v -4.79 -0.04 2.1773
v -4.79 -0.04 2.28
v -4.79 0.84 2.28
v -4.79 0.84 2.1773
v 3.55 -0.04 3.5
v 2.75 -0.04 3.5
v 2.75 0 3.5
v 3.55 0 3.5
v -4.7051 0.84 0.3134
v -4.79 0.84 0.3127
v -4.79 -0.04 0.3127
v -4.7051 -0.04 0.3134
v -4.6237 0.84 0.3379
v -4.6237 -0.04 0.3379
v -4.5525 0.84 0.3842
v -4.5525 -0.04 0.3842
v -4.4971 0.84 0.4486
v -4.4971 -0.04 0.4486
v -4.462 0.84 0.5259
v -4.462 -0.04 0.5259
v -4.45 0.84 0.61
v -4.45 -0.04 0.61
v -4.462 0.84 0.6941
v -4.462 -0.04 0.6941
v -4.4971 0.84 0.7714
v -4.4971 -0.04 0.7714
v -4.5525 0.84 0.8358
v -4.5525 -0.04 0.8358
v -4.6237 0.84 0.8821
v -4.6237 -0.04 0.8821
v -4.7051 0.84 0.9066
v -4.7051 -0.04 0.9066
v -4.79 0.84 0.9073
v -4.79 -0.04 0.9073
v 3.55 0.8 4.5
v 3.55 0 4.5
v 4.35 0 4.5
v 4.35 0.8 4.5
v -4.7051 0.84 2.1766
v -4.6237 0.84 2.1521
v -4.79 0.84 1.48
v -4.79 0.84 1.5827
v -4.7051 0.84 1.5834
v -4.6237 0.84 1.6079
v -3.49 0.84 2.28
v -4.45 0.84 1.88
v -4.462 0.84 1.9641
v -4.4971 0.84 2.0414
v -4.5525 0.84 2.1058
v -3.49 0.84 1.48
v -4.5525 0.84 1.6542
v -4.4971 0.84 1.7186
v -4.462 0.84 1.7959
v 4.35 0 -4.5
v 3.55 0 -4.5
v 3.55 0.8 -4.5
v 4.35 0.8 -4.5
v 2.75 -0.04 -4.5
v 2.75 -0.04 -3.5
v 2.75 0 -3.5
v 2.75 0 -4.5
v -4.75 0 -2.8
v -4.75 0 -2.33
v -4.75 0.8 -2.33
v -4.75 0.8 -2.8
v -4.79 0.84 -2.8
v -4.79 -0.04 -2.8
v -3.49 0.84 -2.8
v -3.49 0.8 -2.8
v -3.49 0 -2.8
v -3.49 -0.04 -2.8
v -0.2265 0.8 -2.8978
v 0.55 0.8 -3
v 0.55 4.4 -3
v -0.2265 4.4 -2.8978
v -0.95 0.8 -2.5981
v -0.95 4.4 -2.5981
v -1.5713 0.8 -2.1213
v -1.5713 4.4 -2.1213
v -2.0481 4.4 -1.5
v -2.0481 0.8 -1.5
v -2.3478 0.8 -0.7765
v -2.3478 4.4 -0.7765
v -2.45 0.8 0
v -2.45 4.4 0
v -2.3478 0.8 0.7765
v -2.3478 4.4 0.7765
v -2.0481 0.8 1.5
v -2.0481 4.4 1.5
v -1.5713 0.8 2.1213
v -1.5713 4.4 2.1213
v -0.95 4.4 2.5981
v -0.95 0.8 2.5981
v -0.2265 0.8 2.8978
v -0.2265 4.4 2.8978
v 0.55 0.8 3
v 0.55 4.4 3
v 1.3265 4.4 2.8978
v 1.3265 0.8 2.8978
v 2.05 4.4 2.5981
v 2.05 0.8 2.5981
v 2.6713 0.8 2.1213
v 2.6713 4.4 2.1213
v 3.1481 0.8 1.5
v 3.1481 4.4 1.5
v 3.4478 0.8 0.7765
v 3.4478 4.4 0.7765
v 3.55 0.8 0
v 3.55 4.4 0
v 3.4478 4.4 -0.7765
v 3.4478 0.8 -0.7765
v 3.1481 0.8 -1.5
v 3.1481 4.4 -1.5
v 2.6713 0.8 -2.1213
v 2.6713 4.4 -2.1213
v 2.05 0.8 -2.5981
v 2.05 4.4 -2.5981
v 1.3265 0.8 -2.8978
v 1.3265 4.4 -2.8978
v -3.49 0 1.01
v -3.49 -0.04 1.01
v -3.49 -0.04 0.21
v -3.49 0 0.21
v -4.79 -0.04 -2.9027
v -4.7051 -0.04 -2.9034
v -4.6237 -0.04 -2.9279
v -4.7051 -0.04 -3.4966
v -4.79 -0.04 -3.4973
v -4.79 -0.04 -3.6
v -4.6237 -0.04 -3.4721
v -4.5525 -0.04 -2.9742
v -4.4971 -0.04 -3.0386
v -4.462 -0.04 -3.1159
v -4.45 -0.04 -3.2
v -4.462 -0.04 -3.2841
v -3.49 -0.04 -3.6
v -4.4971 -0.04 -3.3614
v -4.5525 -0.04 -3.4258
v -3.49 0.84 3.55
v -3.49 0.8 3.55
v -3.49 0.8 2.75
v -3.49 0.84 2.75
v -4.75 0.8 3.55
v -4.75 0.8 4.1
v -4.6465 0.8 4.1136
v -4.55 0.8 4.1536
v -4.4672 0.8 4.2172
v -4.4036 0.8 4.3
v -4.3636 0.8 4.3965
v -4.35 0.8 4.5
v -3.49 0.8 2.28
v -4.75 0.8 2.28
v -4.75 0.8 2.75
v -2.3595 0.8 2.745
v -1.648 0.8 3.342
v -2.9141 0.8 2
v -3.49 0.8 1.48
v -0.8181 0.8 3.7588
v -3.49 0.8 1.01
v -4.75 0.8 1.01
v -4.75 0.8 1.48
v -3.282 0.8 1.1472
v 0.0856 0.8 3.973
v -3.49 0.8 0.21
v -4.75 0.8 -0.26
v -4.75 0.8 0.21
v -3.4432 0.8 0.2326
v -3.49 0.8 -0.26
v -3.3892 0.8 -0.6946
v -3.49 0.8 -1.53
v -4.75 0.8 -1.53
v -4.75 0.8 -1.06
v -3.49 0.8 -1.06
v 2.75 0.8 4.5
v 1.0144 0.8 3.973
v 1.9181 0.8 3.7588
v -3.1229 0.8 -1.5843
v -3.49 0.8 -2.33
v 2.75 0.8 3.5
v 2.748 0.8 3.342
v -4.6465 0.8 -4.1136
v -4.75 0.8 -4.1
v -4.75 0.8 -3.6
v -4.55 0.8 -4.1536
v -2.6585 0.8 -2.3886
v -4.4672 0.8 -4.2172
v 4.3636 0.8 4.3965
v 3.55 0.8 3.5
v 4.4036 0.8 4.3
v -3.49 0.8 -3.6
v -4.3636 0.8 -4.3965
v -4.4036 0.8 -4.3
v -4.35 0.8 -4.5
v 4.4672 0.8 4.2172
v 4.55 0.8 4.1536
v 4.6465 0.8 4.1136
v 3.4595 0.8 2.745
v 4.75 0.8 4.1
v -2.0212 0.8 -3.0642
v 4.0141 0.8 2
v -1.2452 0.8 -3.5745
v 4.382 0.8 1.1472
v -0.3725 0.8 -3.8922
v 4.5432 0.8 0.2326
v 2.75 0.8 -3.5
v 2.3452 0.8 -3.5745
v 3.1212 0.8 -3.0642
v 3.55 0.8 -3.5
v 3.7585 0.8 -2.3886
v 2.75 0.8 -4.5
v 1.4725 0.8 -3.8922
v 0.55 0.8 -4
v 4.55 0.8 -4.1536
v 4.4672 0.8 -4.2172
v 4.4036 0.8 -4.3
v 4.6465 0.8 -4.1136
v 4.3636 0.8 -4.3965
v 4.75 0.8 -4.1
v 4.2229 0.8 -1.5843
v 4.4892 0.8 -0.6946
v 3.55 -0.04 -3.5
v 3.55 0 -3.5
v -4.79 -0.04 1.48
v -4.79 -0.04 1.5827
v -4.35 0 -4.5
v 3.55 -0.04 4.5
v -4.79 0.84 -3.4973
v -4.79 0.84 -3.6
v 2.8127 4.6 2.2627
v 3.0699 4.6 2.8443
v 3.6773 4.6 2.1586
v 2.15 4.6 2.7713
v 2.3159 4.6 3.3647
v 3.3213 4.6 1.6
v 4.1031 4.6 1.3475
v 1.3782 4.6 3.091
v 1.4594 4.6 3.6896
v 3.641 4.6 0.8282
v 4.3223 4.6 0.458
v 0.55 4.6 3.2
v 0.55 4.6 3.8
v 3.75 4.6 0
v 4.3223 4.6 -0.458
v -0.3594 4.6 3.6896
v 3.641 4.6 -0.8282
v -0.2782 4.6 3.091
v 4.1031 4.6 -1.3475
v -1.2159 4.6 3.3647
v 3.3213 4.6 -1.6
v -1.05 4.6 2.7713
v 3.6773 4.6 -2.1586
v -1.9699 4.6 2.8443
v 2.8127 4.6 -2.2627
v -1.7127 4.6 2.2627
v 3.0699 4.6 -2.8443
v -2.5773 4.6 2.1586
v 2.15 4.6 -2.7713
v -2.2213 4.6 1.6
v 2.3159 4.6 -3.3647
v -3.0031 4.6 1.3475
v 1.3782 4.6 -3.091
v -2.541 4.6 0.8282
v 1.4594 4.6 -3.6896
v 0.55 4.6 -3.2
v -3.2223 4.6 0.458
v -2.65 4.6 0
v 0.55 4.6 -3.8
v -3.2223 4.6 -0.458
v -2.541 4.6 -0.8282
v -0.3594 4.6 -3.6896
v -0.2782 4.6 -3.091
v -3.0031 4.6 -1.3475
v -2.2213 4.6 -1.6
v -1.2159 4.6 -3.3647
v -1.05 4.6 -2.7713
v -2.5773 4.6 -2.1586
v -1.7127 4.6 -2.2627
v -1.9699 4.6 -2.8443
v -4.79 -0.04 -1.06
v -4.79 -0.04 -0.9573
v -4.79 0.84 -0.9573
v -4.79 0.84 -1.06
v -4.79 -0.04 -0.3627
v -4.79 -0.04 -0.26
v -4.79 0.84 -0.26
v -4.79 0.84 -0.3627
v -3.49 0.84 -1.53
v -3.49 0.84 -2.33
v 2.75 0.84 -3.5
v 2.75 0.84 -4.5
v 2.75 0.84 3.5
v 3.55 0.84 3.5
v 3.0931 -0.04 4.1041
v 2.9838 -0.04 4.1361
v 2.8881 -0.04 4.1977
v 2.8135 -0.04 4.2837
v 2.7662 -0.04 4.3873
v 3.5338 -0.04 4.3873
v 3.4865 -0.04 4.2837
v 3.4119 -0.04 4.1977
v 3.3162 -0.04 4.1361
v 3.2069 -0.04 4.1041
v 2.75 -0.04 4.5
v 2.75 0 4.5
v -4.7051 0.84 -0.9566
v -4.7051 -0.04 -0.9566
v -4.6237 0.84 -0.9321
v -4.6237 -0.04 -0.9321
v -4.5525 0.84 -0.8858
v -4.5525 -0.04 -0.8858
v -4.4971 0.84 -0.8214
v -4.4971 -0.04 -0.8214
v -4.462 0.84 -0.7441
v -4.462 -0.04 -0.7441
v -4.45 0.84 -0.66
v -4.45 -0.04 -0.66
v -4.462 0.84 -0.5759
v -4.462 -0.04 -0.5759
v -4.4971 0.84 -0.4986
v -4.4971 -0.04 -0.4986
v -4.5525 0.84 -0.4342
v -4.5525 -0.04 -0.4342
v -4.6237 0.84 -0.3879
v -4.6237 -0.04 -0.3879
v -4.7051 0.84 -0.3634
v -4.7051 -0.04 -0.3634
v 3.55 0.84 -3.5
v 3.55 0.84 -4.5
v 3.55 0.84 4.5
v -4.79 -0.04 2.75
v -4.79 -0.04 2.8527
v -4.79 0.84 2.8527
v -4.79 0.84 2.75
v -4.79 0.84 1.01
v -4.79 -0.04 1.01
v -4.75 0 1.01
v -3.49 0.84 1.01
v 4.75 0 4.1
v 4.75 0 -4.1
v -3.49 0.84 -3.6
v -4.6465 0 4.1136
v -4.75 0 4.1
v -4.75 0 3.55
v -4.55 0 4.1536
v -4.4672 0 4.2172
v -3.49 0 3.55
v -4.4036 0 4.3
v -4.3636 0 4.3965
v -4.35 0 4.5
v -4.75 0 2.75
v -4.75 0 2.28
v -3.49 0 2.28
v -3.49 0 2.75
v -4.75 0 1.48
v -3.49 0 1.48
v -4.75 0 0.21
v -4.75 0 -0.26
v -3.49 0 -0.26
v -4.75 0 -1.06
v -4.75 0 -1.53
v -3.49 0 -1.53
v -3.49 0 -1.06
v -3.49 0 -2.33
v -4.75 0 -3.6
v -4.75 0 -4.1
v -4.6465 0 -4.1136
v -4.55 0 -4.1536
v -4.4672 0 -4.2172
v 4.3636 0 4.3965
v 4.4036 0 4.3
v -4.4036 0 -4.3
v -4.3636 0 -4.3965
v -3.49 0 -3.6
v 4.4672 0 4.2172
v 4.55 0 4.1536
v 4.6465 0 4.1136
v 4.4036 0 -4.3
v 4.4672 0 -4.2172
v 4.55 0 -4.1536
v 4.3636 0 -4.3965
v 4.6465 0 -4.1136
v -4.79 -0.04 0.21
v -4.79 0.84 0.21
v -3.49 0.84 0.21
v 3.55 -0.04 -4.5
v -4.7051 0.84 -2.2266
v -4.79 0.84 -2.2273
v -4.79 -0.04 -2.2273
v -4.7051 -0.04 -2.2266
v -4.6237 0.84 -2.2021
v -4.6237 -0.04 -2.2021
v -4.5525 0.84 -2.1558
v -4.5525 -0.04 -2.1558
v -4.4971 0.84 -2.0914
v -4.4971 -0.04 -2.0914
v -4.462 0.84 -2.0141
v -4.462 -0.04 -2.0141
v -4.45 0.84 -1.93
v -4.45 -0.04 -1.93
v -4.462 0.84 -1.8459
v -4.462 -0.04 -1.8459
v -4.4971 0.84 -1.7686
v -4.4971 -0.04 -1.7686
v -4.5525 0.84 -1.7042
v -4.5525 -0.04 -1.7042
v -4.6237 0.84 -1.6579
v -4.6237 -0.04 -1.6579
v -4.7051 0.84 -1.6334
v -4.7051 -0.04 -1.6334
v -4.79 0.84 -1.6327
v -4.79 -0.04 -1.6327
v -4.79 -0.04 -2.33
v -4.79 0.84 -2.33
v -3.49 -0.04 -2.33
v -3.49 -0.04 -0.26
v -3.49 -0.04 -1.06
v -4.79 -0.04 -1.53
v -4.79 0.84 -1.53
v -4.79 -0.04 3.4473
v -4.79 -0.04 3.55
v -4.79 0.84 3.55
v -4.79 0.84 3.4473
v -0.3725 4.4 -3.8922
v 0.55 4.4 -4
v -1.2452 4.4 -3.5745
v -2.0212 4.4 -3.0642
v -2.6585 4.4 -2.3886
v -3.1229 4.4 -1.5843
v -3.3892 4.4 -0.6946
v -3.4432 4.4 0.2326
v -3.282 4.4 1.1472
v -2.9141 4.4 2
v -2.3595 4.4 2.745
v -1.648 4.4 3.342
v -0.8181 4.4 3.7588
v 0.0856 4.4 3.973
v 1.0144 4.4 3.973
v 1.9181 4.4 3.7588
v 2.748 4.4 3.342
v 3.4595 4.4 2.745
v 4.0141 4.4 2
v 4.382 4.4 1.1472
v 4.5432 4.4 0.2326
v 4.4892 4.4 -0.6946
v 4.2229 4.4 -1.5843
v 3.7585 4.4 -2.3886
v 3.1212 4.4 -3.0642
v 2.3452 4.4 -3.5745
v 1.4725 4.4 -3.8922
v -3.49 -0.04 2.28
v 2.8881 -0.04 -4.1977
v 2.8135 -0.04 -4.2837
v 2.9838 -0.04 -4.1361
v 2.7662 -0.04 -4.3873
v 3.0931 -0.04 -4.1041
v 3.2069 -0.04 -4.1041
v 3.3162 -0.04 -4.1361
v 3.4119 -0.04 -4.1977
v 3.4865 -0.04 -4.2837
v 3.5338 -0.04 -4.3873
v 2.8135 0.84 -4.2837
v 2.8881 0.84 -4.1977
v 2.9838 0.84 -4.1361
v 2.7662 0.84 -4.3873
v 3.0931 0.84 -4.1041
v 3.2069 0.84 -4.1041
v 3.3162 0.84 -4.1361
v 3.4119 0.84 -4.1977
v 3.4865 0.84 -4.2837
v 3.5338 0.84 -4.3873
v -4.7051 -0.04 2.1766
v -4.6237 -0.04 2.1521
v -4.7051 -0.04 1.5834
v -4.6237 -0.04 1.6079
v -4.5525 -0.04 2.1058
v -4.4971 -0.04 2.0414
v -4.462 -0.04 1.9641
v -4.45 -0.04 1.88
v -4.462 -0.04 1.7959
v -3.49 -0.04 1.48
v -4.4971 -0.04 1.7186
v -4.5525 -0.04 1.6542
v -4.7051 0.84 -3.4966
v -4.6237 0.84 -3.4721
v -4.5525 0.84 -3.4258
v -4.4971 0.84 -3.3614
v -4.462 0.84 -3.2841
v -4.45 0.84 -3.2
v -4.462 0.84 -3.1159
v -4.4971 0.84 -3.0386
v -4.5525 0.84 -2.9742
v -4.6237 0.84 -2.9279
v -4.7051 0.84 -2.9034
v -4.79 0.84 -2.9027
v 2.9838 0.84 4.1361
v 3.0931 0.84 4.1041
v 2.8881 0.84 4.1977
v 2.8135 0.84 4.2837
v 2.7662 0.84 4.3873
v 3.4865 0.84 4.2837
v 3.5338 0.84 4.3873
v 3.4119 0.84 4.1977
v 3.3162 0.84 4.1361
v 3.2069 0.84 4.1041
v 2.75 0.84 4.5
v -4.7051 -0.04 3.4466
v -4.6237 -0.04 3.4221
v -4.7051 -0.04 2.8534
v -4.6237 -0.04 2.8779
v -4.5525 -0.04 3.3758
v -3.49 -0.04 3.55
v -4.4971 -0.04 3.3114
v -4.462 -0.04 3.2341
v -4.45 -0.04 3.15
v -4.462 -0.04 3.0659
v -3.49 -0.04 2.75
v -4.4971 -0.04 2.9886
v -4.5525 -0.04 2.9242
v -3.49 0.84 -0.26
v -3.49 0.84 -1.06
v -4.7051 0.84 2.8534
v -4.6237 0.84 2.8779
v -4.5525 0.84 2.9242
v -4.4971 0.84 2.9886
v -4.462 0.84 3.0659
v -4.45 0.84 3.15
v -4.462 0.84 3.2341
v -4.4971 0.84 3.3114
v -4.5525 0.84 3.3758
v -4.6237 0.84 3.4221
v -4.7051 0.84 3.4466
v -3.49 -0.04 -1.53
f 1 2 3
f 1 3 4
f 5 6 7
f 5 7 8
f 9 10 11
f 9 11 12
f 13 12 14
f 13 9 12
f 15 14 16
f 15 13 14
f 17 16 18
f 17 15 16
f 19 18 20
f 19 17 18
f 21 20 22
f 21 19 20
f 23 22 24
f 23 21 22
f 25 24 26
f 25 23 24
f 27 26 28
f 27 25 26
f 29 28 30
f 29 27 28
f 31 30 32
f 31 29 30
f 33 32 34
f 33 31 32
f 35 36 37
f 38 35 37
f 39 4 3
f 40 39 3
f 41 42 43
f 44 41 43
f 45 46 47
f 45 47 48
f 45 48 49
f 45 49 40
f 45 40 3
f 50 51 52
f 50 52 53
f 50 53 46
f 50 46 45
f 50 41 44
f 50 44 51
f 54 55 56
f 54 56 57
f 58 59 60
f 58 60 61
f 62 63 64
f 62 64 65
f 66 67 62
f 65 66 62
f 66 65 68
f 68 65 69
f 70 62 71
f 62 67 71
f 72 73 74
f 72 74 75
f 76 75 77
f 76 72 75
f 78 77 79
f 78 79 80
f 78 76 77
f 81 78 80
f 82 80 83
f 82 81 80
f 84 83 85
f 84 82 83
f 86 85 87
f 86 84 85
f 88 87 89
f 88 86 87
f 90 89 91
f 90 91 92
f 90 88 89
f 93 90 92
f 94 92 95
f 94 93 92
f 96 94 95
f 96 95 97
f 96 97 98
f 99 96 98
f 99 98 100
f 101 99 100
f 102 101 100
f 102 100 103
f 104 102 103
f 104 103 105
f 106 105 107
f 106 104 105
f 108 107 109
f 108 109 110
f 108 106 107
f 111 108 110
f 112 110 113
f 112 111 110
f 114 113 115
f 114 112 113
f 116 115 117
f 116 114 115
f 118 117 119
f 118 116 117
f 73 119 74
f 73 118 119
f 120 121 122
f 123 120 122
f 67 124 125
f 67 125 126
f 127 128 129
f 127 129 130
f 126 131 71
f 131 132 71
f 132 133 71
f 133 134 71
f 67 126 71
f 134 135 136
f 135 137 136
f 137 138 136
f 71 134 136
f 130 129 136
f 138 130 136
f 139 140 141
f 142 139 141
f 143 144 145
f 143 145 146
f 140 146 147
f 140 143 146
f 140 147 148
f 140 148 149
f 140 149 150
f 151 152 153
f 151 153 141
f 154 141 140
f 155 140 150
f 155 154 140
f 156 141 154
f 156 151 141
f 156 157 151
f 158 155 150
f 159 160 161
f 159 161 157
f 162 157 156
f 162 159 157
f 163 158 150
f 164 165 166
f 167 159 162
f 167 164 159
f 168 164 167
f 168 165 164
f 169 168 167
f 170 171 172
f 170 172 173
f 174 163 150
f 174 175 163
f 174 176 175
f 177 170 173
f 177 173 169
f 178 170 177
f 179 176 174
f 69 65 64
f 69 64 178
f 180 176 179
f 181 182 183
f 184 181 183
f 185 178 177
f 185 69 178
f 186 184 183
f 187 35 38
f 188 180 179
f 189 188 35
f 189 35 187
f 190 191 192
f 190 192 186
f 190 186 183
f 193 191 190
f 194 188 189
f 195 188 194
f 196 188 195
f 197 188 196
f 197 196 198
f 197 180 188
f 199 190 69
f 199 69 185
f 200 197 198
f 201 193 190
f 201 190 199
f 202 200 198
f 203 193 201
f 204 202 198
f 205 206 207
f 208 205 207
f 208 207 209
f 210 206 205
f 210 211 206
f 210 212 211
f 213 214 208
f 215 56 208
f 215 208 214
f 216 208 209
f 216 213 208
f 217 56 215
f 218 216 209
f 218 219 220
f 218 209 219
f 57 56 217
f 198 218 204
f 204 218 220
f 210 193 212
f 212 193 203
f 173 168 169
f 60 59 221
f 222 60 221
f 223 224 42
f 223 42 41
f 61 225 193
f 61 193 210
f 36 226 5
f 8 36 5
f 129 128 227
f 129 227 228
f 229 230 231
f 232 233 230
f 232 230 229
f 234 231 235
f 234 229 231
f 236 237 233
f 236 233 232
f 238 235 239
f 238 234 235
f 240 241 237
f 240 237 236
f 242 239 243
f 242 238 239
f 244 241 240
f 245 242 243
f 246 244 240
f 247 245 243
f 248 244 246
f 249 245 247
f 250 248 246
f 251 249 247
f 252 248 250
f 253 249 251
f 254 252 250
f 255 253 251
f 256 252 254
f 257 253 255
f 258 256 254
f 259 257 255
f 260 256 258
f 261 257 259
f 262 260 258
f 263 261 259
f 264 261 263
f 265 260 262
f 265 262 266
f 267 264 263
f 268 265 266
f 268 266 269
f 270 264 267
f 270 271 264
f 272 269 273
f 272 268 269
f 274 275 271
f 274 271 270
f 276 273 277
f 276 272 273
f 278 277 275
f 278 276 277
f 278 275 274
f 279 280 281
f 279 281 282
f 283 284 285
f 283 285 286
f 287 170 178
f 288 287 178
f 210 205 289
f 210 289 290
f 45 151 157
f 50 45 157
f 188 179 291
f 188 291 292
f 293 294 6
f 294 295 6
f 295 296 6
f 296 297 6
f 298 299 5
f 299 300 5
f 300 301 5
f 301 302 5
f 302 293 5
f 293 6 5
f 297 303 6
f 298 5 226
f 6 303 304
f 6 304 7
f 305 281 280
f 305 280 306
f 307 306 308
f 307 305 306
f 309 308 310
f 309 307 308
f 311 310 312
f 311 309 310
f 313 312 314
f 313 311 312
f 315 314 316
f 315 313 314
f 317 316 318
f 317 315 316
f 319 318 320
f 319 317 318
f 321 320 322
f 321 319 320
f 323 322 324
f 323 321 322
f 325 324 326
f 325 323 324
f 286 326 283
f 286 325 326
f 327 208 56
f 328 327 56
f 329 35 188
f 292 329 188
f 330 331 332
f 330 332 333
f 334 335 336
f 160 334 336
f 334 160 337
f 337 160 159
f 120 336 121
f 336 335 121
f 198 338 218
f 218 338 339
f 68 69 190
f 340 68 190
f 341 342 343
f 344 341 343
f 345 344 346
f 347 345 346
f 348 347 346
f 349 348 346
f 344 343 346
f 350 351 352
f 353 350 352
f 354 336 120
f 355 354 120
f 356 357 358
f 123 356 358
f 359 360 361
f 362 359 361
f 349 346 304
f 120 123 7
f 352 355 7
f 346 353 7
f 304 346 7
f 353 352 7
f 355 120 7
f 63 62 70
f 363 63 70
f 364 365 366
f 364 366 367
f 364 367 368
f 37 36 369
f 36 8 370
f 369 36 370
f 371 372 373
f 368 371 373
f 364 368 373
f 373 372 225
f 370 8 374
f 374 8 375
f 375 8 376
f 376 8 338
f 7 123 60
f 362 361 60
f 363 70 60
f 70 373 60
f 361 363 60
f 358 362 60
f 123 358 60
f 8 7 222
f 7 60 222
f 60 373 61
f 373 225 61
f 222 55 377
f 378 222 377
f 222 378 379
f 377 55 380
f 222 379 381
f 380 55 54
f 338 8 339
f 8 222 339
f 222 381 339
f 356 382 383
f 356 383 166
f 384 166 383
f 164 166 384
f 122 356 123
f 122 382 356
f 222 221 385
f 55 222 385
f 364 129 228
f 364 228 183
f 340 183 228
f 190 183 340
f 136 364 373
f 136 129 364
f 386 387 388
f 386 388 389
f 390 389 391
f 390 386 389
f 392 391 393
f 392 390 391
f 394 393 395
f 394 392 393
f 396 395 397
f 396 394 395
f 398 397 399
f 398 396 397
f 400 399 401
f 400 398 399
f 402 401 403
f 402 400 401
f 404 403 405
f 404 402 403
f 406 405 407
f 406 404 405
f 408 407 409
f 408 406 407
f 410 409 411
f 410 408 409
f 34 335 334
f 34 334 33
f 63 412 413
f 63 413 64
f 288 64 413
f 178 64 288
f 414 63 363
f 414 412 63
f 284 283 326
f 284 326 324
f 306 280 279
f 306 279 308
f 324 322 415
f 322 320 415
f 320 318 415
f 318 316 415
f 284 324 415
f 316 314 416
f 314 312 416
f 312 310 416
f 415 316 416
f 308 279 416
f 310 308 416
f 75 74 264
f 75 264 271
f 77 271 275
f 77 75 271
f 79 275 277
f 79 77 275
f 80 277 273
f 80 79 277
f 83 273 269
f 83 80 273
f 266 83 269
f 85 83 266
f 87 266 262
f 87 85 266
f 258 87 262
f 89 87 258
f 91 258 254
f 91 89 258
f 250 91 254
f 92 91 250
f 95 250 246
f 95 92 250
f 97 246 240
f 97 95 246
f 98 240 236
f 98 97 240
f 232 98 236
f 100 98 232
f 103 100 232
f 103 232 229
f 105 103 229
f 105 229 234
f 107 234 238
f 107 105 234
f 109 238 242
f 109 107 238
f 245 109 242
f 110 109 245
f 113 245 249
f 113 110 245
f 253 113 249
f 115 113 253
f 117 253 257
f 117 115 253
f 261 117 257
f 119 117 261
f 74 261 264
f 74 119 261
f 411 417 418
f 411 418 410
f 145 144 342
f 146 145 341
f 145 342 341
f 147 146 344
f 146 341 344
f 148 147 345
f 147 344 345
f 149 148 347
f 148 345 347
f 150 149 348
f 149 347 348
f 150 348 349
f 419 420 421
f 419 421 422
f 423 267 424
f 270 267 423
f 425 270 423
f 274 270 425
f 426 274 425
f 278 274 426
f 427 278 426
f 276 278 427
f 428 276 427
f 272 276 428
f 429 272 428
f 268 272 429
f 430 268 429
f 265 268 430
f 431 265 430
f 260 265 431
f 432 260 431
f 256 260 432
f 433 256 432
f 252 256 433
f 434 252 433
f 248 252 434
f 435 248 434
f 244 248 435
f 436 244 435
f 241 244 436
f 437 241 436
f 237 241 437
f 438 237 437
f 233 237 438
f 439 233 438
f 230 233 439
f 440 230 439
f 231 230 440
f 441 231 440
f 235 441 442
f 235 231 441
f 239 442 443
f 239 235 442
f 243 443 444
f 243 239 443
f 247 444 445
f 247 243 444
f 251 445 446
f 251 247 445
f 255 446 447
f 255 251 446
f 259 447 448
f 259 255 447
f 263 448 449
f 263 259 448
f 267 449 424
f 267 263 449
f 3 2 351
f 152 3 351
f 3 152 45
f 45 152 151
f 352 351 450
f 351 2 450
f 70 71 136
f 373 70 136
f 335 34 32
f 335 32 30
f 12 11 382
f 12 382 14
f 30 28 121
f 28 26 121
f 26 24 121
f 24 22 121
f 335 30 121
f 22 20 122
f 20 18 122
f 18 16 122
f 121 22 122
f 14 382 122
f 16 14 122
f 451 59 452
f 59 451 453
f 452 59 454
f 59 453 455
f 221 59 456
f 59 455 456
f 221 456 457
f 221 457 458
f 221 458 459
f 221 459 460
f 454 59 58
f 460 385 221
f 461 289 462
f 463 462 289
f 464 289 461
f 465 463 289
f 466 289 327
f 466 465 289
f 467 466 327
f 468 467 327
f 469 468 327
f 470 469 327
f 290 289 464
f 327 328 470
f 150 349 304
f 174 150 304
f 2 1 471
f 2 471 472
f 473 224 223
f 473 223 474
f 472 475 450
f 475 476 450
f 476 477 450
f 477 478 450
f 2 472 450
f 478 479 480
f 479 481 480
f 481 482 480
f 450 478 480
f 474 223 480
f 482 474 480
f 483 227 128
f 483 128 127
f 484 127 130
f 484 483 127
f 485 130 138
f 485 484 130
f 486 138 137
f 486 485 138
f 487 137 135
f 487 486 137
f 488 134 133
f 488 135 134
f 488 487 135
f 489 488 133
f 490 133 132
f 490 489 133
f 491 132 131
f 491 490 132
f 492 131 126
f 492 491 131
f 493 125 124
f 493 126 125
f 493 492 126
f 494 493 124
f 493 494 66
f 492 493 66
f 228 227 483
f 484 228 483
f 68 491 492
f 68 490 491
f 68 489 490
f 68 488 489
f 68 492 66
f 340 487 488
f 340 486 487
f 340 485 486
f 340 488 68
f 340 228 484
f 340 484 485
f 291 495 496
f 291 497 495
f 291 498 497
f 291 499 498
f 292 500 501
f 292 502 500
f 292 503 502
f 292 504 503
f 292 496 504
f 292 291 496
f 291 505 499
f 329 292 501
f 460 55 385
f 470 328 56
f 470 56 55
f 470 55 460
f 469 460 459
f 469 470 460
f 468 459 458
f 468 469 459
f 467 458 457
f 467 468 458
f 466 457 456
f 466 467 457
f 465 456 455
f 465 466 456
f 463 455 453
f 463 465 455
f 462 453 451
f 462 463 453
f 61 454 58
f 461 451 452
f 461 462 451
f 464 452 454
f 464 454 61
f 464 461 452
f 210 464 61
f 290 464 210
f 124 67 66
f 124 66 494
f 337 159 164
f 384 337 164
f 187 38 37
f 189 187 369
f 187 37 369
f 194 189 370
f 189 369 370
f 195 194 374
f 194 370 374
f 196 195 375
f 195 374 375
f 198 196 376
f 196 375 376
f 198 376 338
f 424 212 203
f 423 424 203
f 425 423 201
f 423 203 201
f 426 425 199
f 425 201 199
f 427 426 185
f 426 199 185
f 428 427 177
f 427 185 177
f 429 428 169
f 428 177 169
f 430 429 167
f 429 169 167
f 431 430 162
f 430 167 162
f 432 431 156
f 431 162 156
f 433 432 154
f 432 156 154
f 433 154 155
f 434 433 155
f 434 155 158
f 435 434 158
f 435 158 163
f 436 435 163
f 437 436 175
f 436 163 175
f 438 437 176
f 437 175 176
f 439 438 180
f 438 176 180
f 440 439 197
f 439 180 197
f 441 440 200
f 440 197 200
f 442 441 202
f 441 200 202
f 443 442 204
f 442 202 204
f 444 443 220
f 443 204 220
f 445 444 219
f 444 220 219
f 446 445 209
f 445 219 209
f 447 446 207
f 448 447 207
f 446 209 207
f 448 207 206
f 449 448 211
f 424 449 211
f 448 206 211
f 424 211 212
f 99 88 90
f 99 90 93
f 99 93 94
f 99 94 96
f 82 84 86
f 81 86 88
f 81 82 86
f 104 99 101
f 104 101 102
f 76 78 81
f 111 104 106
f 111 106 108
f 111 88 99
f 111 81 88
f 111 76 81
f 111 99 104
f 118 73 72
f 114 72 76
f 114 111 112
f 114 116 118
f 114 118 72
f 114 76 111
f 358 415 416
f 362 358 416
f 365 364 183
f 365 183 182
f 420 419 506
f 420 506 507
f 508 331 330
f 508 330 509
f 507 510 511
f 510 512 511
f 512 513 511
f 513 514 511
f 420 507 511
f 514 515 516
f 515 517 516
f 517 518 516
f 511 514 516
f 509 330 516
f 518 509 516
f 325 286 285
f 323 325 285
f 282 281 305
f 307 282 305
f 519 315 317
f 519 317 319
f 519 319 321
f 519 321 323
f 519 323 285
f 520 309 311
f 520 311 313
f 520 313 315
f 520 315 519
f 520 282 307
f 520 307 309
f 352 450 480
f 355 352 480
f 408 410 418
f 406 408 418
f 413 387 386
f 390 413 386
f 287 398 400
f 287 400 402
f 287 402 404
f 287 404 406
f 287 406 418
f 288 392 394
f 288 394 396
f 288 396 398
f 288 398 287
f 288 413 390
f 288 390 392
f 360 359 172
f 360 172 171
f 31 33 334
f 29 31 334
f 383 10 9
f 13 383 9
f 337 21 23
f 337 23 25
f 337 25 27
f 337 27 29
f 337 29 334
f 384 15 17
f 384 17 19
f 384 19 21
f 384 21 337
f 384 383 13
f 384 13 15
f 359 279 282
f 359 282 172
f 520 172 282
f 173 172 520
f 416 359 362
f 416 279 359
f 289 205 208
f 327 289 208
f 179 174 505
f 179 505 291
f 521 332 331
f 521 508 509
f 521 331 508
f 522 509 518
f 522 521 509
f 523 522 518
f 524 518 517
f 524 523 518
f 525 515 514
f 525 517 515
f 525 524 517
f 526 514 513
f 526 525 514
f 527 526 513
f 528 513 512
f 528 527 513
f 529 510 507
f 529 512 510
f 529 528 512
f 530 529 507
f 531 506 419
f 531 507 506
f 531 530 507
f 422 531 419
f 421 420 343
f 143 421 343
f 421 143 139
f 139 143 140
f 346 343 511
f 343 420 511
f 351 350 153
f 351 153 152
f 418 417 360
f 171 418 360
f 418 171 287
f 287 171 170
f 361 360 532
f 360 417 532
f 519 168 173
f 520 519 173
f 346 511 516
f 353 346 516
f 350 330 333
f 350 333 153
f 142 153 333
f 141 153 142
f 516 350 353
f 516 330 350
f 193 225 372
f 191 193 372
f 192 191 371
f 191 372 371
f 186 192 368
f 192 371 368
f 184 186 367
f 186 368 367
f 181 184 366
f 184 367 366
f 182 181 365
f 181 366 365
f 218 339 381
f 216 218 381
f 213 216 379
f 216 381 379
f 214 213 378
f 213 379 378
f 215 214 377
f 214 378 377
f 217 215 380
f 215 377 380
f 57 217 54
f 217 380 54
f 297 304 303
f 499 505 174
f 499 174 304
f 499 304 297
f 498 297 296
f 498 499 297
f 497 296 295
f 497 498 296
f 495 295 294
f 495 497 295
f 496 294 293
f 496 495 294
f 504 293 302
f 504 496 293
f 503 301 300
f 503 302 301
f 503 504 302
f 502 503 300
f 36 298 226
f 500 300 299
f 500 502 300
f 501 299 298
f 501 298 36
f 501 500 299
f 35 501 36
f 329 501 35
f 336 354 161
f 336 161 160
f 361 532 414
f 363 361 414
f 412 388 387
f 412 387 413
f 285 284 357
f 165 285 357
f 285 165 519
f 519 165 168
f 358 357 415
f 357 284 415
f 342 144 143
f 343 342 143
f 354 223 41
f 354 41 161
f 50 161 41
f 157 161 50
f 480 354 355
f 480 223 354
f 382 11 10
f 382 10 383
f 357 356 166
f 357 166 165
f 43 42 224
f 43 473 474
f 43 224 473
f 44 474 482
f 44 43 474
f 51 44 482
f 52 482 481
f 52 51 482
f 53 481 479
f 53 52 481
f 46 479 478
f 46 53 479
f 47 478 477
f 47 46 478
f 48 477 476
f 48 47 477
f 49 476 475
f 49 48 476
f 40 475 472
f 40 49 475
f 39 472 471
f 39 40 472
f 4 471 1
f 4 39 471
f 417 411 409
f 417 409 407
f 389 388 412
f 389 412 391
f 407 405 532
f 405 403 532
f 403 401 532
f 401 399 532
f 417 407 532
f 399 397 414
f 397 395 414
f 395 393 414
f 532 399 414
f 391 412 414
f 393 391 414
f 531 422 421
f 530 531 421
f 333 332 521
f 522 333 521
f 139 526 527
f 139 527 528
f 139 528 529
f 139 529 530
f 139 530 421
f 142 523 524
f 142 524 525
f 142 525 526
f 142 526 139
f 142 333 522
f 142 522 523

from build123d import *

# Parameters (mm, degrees)
SKETCH_1_W               = 9.5
SKETCH_1_H               = 9
EXTRUDE_1_DEPTH          = 0.8
SKETCH_4_R               = 0.4
CUT_EXTRUDE_1_DEPTH      = 7.59185103
EXTRUDE_2_DEPTH          = 0.04
EXTRUDE_2_DEPTH_BACK     = 0.84
SKETCH_6_W               = 1.3
SKETCH_6_H               = 0.8
SKETCH_6_W_2             = 0.8
SKETCH_6_H_2             = 1
CUT_EXTRUDE_2_DEPTH      = 7.62568487
CUT_EXTRUDE_2_DEPTH_BACK = 7.62568487
SKETCH_5_R               = 0.4
SKETCH_5_R_2             = 0.3
SKETCH_7_R               = 4
SKETCH_7_R_2             = 3
EXTRUDE_3_DEPTH          = 3.8
CHAMFER_1_SIZE           = 0.2
CHAMFER_2_SIZE           = 0.2


with BuildPart() as part:
    # Эскиз1 → Бобышка-Вытянуть1 (new body)
    with BuildSketch(Plane(origin=(0, 0, 0), x_dir=(1, 0, 0), z_dir=(0, 1, 0))):
        Rectangle(SKETCH_1_W, SKETCH_1_H)
    extrude(amount=EXTRUDE_1_DEPTH)

    # Эскиз4 → Вырез-Вытянуть1 (cut, through all)
    with BuildSketch(Plane.XZ):
        with Locations((-4.75, -4.5)):
            Circle(SKETCH_4_R)
        with Locations((4.75, -4.5)):
            Circle(SKETCH_4_R)
        with Locations((-4.75, 4.5)):
            Circle(SKETCH_4_R)
        with Locations((4.75, 4.5)):
            Circle(SKETCH_4_R)
    extrude(amount=-CUT_EXTRUDE_1_DEPTH, mode=Mode.SUBTRACT)

    # Эскиз6 → Бобышка-Вытянуть2 (add, two sides: drawn at the far end of the back side and taken through both)
    with BuildSketch(Plane(origin=(0, 0.8, 0), x_dir=(1, 0, 0), z_dir=(0, 1, 0)).offset(-EXTRUDE_2_DEPTH_BACK)):
        with Locations((-4.14, 3.2)):
            Rectangle(SKETCH_6_W, SKETCH_6_H)
        with Locations((-4.14, 1.93)):
            Rectangle(SKETCH_6_W, SKETCH_6_H)
        with Locations((-4.14, 0.66)):
            Rectangle(SKETCH_6_W, SKETCH_6_H)
        with Locations((-4.14, -0.61)):
            Rectangle(SKETCH_6_W, SKETCH_6_H)
        with Locations((-4.14, -1.88)):
            Rectangle(SKETCH_6_W, SKETCH_6_H)
        with Locations((-4.14, -3.15)):
            Rectangle(SKETCH_6_W, SKETCH_6_H)
        with Locations((3.15, 4)):
            Rectangle(SKETCH_6_W_2, SKETCH_6_H_2)
        with Locations((3.15, -4)):
            Rectangle(SKETCH_6_W_2, SKETCH_6_H_2)
    extrude(amount=EXTRUDE_2_DEPTH + EXTRUDE_2_DEPTH_BACK)

    # Эскиз5 → Вырез-Вытянуть2 (cut, two sides: drawn at the far end of the back side and taken through both)
    with BuildSketch(Plane.XZ.offset(-CUT_EXTRUDE_2_DEPTH_BACK)):
        with Locations((3.15, 4.5)):
            Circle(SKETCH_5_R)
        with Locations((3.15, -4.5)):
            Circle(SKETCH_5_R)
        with Locations((-4.75, -3.2)):
            Circle(SKETCH_5_R_2)
        with Locations((-4.75, -1.93)):
            Circle(SKETCH_5_R_2)
        with Locations((-4.75, -0.66)):
            Circle(SKETCH_5_R_2)
        with Locations((-4.75, 0.61)):
            Circle(SKETCH_5_R_2)
        with Locations((-4.75, 1.88)):
            Circle(SKETCH_5_R_2)
        with Locations((-4.75, 3.15)):
            Circle(SKETCH_5_R_2)
    extrude(amount=CUT_EXTRUDE_2_DEPTH + CUT_EXTRUDE_2_DEPTH_BACK, mode=Mode.SUBTRACT)

    # Эскиз7 → Бобышка-Вытянуть3 (add)
    with BuildSketch(Plane(origin=(0, 0.8, 0), x_dir=(1, 0, 0), z_dir=(0, 1, 0))):
        with Locations(Location((0.55, 0, 0), (0, 0, 90))):
            Circle(SKETCH_7_R)
        with Locations(Location((0.55, 0, 0), (0, 0, 90))):
            Circle(SKETCH_7_R_2, mode=Mode.SUBTRACT)
    extrude(amount=EXTRUDE_3_DEPTH)

    # Фаска1
    chamfer_1_edges = [part.edges().sort_by_distance(p)[0] for p in [
        (0.55, 4.6, 4),
    ]]
    chamfer(chamfer_1_edges, length=CHAMFER_1_SIZE)

    # Фаска2
    chamfer_2_edges = [part.edges().sort_by_distance(p)[0] for p in [
        (0.55, 4.6, 3),
    ]]
    chamfer(chamfer_2_edges, length=CHAMFER_2_SIZE)


solid = part.part
